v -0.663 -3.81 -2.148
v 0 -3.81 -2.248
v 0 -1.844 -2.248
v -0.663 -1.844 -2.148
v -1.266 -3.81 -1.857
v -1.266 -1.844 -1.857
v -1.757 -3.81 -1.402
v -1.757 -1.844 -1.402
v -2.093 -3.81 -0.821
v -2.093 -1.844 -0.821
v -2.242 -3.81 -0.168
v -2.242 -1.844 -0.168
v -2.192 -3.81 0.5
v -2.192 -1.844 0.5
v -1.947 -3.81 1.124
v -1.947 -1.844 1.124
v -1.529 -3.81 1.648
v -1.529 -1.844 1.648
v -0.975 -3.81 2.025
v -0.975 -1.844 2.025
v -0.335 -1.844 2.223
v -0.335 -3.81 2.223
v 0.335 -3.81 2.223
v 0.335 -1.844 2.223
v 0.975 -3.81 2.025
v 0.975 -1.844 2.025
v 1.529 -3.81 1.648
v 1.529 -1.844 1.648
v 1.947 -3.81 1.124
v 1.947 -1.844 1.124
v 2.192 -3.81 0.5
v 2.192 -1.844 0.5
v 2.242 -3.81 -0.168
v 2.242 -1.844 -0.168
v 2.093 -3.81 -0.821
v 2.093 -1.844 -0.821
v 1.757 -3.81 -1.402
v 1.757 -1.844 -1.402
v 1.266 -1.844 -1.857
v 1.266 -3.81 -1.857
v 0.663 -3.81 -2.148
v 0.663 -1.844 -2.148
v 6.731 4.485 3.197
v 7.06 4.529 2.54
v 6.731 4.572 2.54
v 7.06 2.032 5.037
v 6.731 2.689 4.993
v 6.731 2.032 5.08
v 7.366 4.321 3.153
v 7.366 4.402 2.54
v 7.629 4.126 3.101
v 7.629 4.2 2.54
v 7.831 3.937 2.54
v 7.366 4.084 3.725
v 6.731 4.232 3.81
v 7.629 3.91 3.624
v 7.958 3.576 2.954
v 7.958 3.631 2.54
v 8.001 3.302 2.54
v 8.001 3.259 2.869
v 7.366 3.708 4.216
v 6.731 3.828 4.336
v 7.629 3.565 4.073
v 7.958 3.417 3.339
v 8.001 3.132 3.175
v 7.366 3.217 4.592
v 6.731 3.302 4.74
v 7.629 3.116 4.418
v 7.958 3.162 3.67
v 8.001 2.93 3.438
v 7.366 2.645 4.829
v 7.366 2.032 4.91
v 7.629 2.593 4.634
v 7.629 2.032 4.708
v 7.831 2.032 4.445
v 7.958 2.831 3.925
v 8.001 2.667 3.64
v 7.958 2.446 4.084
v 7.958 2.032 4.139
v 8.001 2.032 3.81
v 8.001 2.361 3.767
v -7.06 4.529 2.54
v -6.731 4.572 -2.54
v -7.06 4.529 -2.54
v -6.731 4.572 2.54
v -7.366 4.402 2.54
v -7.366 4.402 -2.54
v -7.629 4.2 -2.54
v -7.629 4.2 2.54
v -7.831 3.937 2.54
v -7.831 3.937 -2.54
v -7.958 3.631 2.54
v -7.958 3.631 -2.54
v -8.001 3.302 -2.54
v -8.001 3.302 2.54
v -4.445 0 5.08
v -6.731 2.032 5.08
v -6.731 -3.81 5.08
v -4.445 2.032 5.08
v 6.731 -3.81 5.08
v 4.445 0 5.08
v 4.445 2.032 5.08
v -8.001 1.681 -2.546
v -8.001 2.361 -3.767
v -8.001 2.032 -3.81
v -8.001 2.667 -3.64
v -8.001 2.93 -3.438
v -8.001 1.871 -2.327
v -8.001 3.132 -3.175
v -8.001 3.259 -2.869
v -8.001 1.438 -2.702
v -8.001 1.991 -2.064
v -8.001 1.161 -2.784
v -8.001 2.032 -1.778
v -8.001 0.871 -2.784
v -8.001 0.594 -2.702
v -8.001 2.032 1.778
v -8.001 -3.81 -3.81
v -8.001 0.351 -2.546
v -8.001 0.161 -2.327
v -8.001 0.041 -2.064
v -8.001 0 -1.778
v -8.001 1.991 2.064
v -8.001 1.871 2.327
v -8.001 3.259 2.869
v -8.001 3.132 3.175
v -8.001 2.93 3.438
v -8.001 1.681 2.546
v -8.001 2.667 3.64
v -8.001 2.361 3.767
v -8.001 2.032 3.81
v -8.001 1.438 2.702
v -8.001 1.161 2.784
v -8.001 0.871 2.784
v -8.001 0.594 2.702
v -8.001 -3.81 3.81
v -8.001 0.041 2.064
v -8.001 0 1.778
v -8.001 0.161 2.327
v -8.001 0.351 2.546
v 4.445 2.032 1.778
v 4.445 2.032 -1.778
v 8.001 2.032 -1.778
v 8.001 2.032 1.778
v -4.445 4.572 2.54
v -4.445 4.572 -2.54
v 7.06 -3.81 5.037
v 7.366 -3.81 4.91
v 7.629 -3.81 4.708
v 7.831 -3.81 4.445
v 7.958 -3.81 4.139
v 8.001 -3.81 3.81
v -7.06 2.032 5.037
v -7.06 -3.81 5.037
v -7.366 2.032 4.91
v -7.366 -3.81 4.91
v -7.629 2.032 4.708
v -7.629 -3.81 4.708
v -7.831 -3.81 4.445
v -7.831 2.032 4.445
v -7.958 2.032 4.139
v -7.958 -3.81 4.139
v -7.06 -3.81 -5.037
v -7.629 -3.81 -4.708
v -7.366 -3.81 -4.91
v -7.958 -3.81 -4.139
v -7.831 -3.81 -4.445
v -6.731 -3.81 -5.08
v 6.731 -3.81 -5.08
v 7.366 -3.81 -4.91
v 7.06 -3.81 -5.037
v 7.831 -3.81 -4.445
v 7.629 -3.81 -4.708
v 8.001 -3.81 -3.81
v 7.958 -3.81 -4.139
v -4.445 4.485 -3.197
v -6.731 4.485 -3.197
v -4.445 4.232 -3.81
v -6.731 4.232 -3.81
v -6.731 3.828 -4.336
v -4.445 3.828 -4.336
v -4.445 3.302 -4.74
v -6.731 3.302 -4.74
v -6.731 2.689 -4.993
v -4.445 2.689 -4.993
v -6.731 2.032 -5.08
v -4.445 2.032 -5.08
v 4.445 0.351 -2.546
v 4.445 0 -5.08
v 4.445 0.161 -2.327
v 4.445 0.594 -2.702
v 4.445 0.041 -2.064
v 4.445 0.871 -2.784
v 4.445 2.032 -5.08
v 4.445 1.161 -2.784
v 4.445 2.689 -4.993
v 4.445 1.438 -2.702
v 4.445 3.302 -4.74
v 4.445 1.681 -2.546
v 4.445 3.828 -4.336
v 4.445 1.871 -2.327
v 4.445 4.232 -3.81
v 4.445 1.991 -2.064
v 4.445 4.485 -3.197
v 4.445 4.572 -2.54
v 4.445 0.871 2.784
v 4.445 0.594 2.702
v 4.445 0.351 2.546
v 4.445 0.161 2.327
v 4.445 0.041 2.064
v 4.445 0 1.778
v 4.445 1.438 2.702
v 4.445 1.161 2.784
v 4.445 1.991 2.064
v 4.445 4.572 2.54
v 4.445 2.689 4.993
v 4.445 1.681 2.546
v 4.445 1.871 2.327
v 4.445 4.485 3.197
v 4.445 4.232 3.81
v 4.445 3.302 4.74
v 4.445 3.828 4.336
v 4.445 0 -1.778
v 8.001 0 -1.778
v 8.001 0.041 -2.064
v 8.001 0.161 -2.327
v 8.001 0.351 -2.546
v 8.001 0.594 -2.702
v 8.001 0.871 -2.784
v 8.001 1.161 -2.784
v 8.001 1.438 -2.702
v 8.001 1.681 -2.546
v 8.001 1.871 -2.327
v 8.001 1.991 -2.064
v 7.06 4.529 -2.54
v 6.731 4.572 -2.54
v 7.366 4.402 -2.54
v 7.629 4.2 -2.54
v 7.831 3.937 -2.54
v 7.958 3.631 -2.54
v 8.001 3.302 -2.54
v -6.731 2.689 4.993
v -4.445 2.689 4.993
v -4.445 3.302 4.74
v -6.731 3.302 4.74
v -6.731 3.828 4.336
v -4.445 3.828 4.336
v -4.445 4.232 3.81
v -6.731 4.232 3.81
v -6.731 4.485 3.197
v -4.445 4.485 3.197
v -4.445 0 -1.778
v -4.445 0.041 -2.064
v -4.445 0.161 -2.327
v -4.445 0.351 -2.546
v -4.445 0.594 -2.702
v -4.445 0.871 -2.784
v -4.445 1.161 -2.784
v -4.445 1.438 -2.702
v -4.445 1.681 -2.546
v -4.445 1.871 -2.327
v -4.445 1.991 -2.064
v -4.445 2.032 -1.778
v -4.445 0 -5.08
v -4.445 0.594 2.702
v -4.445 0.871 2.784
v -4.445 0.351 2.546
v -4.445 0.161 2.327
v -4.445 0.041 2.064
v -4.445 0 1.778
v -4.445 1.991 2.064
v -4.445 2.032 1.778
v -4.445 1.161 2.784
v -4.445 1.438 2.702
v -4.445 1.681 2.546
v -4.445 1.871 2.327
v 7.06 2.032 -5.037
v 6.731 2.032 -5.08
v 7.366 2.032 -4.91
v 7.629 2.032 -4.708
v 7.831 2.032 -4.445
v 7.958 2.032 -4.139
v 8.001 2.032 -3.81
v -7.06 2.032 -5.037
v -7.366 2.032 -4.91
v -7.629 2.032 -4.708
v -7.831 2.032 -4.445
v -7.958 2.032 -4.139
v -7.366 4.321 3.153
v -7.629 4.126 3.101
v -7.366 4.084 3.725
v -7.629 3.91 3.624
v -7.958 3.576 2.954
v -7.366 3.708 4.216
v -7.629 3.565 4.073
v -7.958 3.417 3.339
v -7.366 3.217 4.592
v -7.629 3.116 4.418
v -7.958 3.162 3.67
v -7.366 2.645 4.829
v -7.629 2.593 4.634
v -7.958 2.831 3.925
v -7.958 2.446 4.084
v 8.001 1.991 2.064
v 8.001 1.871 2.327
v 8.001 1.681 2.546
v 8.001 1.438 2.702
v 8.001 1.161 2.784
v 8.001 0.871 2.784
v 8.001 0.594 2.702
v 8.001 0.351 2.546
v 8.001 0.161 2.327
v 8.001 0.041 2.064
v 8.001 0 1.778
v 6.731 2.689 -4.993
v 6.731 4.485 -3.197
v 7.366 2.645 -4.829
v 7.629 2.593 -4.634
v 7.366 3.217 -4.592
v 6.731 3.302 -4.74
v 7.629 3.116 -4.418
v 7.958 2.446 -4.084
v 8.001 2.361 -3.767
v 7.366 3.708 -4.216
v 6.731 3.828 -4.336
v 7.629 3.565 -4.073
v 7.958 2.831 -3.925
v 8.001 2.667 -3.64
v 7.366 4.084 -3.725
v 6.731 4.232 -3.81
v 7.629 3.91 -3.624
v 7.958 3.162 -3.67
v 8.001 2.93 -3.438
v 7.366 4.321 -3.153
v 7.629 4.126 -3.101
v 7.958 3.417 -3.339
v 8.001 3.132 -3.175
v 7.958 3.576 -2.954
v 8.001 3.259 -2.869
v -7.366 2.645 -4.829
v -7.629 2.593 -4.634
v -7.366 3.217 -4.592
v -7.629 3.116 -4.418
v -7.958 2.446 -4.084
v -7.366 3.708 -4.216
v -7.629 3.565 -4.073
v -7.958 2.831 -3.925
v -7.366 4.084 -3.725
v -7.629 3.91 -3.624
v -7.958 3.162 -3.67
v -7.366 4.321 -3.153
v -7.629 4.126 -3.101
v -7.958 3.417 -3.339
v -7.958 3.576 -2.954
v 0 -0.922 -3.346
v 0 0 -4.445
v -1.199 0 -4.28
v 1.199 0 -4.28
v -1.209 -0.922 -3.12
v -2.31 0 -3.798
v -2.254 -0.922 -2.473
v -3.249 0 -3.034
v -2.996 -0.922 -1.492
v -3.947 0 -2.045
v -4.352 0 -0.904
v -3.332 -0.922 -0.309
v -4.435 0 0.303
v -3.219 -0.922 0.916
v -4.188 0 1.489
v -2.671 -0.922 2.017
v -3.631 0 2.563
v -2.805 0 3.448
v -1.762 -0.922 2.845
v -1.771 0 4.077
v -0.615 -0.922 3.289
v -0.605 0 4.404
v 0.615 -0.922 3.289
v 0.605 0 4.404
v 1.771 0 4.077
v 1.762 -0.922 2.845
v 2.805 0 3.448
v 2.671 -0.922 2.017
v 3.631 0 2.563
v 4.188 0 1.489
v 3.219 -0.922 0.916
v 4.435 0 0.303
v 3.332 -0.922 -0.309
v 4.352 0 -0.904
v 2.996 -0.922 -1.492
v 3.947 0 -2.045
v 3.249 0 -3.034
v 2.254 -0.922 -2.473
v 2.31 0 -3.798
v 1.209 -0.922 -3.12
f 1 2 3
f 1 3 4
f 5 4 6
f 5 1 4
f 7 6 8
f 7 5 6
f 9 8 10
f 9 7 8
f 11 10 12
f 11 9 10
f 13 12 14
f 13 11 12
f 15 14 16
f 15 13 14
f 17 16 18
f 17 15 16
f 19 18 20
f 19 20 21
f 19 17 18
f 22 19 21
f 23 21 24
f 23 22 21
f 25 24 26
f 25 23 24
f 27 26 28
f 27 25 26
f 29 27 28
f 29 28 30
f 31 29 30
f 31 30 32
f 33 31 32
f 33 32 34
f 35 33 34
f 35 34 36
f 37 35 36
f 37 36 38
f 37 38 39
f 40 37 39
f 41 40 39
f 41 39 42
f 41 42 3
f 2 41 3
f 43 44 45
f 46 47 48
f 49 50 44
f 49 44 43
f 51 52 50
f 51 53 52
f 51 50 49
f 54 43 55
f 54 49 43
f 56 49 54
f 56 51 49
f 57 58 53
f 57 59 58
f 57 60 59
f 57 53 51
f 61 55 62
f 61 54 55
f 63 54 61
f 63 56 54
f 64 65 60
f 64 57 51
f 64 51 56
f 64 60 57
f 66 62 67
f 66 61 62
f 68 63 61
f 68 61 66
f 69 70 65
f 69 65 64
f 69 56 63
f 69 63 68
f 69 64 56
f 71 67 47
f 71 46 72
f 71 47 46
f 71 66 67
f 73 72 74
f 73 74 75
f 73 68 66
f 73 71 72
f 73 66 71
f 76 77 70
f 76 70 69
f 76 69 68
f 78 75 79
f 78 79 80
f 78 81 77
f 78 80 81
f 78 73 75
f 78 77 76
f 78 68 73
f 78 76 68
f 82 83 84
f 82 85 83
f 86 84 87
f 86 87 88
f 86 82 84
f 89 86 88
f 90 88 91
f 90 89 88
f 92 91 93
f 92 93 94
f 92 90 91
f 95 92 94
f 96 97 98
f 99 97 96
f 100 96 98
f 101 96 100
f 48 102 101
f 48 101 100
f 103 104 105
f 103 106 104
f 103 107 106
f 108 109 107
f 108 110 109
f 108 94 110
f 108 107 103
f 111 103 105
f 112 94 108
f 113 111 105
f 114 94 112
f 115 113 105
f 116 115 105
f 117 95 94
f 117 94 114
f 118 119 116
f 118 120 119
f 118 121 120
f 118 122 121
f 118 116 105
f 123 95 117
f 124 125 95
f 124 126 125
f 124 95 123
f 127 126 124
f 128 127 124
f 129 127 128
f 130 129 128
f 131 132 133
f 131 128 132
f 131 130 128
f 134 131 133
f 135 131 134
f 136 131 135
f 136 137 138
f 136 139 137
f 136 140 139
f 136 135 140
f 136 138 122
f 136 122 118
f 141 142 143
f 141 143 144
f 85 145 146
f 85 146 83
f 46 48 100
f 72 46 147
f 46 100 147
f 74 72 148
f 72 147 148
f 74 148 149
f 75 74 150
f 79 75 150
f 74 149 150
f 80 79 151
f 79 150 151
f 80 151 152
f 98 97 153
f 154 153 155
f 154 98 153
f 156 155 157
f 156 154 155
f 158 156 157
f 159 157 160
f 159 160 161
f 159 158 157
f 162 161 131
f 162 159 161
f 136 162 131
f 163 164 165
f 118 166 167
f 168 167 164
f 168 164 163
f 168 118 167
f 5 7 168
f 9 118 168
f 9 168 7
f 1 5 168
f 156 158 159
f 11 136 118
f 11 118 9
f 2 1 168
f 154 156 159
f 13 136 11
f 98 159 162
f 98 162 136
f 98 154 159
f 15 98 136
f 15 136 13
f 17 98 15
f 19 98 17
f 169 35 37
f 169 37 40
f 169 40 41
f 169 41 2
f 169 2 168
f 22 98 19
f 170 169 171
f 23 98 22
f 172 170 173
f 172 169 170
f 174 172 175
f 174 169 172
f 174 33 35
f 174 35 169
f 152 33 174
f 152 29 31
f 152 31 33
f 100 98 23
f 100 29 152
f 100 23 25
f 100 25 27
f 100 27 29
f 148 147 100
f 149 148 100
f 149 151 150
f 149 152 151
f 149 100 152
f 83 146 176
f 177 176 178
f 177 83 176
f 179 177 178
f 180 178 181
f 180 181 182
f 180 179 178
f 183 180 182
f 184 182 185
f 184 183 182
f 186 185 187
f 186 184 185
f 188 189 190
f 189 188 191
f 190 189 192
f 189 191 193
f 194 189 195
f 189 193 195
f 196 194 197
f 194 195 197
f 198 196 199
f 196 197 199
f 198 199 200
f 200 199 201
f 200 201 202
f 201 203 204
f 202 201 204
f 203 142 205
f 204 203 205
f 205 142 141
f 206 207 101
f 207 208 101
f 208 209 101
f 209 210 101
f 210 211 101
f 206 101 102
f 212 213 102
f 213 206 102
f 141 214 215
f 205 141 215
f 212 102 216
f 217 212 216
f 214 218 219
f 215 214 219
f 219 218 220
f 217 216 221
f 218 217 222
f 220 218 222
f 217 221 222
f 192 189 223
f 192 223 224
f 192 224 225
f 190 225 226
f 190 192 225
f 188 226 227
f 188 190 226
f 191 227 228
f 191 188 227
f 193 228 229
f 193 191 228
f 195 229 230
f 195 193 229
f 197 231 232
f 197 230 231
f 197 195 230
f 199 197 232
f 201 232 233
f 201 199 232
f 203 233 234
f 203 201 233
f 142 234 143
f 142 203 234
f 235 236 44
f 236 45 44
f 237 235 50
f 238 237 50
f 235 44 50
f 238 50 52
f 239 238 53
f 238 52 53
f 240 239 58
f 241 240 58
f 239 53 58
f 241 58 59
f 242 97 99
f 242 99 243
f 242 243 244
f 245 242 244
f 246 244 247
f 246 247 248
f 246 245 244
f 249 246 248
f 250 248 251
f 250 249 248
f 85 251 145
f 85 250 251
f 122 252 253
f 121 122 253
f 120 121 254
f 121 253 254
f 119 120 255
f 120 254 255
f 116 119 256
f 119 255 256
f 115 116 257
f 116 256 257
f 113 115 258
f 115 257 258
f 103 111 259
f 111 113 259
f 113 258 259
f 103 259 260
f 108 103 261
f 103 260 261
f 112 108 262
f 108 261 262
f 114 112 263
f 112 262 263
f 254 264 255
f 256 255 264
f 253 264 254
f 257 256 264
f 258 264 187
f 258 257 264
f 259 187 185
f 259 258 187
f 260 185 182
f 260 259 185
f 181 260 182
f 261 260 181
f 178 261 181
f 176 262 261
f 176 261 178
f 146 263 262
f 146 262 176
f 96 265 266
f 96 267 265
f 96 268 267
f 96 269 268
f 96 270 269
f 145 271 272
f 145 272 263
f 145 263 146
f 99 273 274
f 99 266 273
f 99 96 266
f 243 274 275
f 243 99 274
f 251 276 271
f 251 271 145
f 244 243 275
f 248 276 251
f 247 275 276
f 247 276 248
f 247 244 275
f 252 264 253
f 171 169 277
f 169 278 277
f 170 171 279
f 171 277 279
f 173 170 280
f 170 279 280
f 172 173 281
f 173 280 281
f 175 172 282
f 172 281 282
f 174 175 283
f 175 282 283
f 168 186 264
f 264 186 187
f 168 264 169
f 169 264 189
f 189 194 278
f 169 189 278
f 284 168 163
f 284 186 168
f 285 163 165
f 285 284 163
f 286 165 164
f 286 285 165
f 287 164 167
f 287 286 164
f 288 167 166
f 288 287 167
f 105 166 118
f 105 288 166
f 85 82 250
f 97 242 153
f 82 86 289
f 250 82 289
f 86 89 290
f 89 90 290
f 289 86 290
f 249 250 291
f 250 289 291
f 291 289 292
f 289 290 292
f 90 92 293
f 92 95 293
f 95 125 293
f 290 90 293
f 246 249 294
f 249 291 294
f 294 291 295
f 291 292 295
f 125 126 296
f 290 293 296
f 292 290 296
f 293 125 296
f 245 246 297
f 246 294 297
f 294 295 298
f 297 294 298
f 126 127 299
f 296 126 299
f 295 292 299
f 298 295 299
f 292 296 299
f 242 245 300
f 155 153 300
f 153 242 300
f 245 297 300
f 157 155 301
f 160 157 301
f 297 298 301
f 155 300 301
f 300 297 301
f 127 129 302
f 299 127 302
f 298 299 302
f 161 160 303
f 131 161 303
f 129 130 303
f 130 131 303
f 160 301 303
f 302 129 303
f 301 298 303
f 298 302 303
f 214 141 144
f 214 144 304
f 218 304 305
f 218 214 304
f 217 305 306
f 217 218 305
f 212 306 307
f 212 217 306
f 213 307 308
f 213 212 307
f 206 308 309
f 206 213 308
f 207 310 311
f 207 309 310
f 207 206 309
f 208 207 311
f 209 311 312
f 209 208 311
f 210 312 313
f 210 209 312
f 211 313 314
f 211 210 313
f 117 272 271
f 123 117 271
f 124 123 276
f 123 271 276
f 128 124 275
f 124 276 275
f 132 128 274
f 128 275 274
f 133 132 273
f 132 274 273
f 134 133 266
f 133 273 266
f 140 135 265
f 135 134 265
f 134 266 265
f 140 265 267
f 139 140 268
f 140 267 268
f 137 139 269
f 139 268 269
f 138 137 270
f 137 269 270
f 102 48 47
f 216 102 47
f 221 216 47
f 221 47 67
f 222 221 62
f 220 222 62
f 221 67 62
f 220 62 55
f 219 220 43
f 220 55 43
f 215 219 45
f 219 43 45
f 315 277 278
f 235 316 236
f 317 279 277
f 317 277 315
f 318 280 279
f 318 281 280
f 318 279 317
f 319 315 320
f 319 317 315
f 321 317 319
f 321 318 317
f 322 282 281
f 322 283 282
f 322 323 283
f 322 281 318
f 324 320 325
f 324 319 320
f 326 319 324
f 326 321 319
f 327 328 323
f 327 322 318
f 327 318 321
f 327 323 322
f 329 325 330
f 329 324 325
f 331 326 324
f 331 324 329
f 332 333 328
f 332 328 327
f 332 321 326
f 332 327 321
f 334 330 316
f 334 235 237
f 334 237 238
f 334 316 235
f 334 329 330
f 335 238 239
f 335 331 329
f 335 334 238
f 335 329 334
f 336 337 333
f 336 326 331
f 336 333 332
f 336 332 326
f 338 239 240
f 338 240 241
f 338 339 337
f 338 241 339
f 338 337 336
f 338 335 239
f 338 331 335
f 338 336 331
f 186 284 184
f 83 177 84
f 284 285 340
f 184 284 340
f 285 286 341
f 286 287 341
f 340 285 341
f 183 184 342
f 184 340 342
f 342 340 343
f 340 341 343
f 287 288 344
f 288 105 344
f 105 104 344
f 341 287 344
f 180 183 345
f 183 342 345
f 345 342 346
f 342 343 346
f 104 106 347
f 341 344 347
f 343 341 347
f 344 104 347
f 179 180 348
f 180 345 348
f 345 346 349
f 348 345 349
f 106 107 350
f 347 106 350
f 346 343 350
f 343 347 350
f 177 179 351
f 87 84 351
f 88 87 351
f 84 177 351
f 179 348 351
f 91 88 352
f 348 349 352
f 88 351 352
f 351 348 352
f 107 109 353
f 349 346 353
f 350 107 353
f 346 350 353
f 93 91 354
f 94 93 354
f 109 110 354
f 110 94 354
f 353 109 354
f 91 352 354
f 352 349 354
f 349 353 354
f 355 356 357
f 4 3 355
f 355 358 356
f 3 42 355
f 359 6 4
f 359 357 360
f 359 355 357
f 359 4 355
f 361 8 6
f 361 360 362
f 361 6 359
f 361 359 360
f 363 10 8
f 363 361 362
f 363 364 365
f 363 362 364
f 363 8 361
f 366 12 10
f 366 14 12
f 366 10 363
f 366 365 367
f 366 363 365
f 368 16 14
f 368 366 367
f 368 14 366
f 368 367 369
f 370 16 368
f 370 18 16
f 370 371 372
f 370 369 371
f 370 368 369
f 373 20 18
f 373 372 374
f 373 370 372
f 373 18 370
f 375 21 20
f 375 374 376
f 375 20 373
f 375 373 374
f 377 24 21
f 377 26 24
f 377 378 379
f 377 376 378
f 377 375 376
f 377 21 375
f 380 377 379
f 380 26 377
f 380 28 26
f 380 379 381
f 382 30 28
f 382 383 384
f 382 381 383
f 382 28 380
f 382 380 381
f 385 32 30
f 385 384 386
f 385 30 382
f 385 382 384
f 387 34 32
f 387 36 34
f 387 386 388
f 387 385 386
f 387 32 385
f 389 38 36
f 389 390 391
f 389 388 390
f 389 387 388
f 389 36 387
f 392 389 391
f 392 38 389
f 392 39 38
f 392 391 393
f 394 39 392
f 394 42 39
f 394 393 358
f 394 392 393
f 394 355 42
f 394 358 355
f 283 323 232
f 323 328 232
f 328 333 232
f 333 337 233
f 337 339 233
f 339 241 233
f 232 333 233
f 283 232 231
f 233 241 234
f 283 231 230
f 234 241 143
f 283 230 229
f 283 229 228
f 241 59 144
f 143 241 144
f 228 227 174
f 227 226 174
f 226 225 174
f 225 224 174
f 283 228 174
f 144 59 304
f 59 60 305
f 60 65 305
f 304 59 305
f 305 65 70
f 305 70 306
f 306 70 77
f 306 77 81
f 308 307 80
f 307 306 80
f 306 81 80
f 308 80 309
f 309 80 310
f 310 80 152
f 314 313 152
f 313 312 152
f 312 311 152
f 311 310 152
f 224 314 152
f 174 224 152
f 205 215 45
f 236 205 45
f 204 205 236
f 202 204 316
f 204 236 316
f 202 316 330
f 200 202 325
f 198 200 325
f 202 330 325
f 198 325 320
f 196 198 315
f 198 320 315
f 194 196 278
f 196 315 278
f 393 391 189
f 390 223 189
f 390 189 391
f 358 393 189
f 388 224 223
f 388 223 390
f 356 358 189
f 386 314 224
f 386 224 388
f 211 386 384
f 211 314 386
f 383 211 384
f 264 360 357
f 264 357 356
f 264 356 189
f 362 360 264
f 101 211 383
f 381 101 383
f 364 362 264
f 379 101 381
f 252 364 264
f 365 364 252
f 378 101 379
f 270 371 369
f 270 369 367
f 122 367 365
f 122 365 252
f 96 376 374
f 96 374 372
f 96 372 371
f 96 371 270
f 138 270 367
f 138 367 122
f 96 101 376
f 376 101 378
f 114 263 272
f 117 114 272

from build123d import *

# Parameters (mm, degrees)
BOSS_EXTRUDE2_DEPTH                               = 5.08
CSK_FOR_8_FLAT_HEAD_MACHINE_SCREW_100_D           = 4.4958
CSK_FOR_8_FLAT_HEAD_MACHINE_SCREW_100_CSINK_D     = 8.89
CSK_FOR_8_FLAT_HEAD_MACHINE_SCREW_100_CSINK_ANGLE = 100
CUT_EXTRUDE1_DEPTH                                = 4.556
FILLET1_R                                         = 2.54
FILLET2_R                                         = 1.27


with BuildPart() as part:
    # Sketch4 → Boss-Extrude2 (new body, symmetric)
    with BuildSketch(Plane.XY):
        Polygon((0, 0), (4.445, 0), (4.445, 4.572), (8.001, 4.572), (8.001, -3.81), (0, -3.81), align=None)
    extrude(amount=BOSS_EXTRUDE2_DEPTH, both=True)

    # CSK for #8 Flat Head Machine Screw (100)2 (through all)
    with Locations(Plane(origin=(0, 0, 0), x_dir=(1, 0, 0), z_dir=(0, 1, 0))):
        with Locations((0, 0)):
            CounterSinkHole(CSK_FOR_8_FLAT_HEAD_MACHINE_SCREW_100_D / 2, CSK_FOR_8_FLAT_HEAD_MACHINE_SCREW_100_CSINK_D / 2, counter_sink_angle=CSK_FOR_8_FLAT_HEAD_MACHINE_SCREW_100_CSINK_ANGLE)

    # Sketch7 → Cut-Extrude1 (cut, through all)
    with BuildSketch(Plane.ZY.offset(-4.445)):
        with BuildLine():
            Line((-1.778, 2.032), (1.778, 2.032))
            ThreePointArc((1.778, 2.032), (2.794, 1.016), (1.778, 0))
            Line((1.778, 0), (-1.778, 0))
            ThreePointArc((-1.778, 0), (-2.794, 1.016), (-1.778, 2.032))
        make_face()
    extrude(amount=-CUT_EXTRUDE1_DEPTH, mode=Mode.SUBTRACT)

    # Fillet1
    fillet1_edges = [part.edges().sort_by_distance(p)[0] for p in [
        (6.223, 4.572, 5.08),
        (6.223, 4.572, -5.08),
    ]]
    fillet(fillet1_edges, radius=FILLET1_R)

    # Fillet2
    fillet2_edges = [part.edges().sort_by_distance(p)[0] for p in [
        (8.001, -0.889, 5.08),
        (8.001, 4.572, 0),
        (8.001, 3.828051224, 4.336051224),
        (8.001, 3.828051224, -4.336051224),
        (8.001, -0.889, -5.08),
    ]]
    fillet(fillet2_edges, radius=FILLET2_R)

    # Mirror2: part across plane


with BuildPart() as part_1:
    add(part.part)
    add(part.part.mirror(Plane(origin=(0, 0, 0), x_dir=(0, 0, 1), z_dir=(1, 0, 0))))


solid = part_1.part
